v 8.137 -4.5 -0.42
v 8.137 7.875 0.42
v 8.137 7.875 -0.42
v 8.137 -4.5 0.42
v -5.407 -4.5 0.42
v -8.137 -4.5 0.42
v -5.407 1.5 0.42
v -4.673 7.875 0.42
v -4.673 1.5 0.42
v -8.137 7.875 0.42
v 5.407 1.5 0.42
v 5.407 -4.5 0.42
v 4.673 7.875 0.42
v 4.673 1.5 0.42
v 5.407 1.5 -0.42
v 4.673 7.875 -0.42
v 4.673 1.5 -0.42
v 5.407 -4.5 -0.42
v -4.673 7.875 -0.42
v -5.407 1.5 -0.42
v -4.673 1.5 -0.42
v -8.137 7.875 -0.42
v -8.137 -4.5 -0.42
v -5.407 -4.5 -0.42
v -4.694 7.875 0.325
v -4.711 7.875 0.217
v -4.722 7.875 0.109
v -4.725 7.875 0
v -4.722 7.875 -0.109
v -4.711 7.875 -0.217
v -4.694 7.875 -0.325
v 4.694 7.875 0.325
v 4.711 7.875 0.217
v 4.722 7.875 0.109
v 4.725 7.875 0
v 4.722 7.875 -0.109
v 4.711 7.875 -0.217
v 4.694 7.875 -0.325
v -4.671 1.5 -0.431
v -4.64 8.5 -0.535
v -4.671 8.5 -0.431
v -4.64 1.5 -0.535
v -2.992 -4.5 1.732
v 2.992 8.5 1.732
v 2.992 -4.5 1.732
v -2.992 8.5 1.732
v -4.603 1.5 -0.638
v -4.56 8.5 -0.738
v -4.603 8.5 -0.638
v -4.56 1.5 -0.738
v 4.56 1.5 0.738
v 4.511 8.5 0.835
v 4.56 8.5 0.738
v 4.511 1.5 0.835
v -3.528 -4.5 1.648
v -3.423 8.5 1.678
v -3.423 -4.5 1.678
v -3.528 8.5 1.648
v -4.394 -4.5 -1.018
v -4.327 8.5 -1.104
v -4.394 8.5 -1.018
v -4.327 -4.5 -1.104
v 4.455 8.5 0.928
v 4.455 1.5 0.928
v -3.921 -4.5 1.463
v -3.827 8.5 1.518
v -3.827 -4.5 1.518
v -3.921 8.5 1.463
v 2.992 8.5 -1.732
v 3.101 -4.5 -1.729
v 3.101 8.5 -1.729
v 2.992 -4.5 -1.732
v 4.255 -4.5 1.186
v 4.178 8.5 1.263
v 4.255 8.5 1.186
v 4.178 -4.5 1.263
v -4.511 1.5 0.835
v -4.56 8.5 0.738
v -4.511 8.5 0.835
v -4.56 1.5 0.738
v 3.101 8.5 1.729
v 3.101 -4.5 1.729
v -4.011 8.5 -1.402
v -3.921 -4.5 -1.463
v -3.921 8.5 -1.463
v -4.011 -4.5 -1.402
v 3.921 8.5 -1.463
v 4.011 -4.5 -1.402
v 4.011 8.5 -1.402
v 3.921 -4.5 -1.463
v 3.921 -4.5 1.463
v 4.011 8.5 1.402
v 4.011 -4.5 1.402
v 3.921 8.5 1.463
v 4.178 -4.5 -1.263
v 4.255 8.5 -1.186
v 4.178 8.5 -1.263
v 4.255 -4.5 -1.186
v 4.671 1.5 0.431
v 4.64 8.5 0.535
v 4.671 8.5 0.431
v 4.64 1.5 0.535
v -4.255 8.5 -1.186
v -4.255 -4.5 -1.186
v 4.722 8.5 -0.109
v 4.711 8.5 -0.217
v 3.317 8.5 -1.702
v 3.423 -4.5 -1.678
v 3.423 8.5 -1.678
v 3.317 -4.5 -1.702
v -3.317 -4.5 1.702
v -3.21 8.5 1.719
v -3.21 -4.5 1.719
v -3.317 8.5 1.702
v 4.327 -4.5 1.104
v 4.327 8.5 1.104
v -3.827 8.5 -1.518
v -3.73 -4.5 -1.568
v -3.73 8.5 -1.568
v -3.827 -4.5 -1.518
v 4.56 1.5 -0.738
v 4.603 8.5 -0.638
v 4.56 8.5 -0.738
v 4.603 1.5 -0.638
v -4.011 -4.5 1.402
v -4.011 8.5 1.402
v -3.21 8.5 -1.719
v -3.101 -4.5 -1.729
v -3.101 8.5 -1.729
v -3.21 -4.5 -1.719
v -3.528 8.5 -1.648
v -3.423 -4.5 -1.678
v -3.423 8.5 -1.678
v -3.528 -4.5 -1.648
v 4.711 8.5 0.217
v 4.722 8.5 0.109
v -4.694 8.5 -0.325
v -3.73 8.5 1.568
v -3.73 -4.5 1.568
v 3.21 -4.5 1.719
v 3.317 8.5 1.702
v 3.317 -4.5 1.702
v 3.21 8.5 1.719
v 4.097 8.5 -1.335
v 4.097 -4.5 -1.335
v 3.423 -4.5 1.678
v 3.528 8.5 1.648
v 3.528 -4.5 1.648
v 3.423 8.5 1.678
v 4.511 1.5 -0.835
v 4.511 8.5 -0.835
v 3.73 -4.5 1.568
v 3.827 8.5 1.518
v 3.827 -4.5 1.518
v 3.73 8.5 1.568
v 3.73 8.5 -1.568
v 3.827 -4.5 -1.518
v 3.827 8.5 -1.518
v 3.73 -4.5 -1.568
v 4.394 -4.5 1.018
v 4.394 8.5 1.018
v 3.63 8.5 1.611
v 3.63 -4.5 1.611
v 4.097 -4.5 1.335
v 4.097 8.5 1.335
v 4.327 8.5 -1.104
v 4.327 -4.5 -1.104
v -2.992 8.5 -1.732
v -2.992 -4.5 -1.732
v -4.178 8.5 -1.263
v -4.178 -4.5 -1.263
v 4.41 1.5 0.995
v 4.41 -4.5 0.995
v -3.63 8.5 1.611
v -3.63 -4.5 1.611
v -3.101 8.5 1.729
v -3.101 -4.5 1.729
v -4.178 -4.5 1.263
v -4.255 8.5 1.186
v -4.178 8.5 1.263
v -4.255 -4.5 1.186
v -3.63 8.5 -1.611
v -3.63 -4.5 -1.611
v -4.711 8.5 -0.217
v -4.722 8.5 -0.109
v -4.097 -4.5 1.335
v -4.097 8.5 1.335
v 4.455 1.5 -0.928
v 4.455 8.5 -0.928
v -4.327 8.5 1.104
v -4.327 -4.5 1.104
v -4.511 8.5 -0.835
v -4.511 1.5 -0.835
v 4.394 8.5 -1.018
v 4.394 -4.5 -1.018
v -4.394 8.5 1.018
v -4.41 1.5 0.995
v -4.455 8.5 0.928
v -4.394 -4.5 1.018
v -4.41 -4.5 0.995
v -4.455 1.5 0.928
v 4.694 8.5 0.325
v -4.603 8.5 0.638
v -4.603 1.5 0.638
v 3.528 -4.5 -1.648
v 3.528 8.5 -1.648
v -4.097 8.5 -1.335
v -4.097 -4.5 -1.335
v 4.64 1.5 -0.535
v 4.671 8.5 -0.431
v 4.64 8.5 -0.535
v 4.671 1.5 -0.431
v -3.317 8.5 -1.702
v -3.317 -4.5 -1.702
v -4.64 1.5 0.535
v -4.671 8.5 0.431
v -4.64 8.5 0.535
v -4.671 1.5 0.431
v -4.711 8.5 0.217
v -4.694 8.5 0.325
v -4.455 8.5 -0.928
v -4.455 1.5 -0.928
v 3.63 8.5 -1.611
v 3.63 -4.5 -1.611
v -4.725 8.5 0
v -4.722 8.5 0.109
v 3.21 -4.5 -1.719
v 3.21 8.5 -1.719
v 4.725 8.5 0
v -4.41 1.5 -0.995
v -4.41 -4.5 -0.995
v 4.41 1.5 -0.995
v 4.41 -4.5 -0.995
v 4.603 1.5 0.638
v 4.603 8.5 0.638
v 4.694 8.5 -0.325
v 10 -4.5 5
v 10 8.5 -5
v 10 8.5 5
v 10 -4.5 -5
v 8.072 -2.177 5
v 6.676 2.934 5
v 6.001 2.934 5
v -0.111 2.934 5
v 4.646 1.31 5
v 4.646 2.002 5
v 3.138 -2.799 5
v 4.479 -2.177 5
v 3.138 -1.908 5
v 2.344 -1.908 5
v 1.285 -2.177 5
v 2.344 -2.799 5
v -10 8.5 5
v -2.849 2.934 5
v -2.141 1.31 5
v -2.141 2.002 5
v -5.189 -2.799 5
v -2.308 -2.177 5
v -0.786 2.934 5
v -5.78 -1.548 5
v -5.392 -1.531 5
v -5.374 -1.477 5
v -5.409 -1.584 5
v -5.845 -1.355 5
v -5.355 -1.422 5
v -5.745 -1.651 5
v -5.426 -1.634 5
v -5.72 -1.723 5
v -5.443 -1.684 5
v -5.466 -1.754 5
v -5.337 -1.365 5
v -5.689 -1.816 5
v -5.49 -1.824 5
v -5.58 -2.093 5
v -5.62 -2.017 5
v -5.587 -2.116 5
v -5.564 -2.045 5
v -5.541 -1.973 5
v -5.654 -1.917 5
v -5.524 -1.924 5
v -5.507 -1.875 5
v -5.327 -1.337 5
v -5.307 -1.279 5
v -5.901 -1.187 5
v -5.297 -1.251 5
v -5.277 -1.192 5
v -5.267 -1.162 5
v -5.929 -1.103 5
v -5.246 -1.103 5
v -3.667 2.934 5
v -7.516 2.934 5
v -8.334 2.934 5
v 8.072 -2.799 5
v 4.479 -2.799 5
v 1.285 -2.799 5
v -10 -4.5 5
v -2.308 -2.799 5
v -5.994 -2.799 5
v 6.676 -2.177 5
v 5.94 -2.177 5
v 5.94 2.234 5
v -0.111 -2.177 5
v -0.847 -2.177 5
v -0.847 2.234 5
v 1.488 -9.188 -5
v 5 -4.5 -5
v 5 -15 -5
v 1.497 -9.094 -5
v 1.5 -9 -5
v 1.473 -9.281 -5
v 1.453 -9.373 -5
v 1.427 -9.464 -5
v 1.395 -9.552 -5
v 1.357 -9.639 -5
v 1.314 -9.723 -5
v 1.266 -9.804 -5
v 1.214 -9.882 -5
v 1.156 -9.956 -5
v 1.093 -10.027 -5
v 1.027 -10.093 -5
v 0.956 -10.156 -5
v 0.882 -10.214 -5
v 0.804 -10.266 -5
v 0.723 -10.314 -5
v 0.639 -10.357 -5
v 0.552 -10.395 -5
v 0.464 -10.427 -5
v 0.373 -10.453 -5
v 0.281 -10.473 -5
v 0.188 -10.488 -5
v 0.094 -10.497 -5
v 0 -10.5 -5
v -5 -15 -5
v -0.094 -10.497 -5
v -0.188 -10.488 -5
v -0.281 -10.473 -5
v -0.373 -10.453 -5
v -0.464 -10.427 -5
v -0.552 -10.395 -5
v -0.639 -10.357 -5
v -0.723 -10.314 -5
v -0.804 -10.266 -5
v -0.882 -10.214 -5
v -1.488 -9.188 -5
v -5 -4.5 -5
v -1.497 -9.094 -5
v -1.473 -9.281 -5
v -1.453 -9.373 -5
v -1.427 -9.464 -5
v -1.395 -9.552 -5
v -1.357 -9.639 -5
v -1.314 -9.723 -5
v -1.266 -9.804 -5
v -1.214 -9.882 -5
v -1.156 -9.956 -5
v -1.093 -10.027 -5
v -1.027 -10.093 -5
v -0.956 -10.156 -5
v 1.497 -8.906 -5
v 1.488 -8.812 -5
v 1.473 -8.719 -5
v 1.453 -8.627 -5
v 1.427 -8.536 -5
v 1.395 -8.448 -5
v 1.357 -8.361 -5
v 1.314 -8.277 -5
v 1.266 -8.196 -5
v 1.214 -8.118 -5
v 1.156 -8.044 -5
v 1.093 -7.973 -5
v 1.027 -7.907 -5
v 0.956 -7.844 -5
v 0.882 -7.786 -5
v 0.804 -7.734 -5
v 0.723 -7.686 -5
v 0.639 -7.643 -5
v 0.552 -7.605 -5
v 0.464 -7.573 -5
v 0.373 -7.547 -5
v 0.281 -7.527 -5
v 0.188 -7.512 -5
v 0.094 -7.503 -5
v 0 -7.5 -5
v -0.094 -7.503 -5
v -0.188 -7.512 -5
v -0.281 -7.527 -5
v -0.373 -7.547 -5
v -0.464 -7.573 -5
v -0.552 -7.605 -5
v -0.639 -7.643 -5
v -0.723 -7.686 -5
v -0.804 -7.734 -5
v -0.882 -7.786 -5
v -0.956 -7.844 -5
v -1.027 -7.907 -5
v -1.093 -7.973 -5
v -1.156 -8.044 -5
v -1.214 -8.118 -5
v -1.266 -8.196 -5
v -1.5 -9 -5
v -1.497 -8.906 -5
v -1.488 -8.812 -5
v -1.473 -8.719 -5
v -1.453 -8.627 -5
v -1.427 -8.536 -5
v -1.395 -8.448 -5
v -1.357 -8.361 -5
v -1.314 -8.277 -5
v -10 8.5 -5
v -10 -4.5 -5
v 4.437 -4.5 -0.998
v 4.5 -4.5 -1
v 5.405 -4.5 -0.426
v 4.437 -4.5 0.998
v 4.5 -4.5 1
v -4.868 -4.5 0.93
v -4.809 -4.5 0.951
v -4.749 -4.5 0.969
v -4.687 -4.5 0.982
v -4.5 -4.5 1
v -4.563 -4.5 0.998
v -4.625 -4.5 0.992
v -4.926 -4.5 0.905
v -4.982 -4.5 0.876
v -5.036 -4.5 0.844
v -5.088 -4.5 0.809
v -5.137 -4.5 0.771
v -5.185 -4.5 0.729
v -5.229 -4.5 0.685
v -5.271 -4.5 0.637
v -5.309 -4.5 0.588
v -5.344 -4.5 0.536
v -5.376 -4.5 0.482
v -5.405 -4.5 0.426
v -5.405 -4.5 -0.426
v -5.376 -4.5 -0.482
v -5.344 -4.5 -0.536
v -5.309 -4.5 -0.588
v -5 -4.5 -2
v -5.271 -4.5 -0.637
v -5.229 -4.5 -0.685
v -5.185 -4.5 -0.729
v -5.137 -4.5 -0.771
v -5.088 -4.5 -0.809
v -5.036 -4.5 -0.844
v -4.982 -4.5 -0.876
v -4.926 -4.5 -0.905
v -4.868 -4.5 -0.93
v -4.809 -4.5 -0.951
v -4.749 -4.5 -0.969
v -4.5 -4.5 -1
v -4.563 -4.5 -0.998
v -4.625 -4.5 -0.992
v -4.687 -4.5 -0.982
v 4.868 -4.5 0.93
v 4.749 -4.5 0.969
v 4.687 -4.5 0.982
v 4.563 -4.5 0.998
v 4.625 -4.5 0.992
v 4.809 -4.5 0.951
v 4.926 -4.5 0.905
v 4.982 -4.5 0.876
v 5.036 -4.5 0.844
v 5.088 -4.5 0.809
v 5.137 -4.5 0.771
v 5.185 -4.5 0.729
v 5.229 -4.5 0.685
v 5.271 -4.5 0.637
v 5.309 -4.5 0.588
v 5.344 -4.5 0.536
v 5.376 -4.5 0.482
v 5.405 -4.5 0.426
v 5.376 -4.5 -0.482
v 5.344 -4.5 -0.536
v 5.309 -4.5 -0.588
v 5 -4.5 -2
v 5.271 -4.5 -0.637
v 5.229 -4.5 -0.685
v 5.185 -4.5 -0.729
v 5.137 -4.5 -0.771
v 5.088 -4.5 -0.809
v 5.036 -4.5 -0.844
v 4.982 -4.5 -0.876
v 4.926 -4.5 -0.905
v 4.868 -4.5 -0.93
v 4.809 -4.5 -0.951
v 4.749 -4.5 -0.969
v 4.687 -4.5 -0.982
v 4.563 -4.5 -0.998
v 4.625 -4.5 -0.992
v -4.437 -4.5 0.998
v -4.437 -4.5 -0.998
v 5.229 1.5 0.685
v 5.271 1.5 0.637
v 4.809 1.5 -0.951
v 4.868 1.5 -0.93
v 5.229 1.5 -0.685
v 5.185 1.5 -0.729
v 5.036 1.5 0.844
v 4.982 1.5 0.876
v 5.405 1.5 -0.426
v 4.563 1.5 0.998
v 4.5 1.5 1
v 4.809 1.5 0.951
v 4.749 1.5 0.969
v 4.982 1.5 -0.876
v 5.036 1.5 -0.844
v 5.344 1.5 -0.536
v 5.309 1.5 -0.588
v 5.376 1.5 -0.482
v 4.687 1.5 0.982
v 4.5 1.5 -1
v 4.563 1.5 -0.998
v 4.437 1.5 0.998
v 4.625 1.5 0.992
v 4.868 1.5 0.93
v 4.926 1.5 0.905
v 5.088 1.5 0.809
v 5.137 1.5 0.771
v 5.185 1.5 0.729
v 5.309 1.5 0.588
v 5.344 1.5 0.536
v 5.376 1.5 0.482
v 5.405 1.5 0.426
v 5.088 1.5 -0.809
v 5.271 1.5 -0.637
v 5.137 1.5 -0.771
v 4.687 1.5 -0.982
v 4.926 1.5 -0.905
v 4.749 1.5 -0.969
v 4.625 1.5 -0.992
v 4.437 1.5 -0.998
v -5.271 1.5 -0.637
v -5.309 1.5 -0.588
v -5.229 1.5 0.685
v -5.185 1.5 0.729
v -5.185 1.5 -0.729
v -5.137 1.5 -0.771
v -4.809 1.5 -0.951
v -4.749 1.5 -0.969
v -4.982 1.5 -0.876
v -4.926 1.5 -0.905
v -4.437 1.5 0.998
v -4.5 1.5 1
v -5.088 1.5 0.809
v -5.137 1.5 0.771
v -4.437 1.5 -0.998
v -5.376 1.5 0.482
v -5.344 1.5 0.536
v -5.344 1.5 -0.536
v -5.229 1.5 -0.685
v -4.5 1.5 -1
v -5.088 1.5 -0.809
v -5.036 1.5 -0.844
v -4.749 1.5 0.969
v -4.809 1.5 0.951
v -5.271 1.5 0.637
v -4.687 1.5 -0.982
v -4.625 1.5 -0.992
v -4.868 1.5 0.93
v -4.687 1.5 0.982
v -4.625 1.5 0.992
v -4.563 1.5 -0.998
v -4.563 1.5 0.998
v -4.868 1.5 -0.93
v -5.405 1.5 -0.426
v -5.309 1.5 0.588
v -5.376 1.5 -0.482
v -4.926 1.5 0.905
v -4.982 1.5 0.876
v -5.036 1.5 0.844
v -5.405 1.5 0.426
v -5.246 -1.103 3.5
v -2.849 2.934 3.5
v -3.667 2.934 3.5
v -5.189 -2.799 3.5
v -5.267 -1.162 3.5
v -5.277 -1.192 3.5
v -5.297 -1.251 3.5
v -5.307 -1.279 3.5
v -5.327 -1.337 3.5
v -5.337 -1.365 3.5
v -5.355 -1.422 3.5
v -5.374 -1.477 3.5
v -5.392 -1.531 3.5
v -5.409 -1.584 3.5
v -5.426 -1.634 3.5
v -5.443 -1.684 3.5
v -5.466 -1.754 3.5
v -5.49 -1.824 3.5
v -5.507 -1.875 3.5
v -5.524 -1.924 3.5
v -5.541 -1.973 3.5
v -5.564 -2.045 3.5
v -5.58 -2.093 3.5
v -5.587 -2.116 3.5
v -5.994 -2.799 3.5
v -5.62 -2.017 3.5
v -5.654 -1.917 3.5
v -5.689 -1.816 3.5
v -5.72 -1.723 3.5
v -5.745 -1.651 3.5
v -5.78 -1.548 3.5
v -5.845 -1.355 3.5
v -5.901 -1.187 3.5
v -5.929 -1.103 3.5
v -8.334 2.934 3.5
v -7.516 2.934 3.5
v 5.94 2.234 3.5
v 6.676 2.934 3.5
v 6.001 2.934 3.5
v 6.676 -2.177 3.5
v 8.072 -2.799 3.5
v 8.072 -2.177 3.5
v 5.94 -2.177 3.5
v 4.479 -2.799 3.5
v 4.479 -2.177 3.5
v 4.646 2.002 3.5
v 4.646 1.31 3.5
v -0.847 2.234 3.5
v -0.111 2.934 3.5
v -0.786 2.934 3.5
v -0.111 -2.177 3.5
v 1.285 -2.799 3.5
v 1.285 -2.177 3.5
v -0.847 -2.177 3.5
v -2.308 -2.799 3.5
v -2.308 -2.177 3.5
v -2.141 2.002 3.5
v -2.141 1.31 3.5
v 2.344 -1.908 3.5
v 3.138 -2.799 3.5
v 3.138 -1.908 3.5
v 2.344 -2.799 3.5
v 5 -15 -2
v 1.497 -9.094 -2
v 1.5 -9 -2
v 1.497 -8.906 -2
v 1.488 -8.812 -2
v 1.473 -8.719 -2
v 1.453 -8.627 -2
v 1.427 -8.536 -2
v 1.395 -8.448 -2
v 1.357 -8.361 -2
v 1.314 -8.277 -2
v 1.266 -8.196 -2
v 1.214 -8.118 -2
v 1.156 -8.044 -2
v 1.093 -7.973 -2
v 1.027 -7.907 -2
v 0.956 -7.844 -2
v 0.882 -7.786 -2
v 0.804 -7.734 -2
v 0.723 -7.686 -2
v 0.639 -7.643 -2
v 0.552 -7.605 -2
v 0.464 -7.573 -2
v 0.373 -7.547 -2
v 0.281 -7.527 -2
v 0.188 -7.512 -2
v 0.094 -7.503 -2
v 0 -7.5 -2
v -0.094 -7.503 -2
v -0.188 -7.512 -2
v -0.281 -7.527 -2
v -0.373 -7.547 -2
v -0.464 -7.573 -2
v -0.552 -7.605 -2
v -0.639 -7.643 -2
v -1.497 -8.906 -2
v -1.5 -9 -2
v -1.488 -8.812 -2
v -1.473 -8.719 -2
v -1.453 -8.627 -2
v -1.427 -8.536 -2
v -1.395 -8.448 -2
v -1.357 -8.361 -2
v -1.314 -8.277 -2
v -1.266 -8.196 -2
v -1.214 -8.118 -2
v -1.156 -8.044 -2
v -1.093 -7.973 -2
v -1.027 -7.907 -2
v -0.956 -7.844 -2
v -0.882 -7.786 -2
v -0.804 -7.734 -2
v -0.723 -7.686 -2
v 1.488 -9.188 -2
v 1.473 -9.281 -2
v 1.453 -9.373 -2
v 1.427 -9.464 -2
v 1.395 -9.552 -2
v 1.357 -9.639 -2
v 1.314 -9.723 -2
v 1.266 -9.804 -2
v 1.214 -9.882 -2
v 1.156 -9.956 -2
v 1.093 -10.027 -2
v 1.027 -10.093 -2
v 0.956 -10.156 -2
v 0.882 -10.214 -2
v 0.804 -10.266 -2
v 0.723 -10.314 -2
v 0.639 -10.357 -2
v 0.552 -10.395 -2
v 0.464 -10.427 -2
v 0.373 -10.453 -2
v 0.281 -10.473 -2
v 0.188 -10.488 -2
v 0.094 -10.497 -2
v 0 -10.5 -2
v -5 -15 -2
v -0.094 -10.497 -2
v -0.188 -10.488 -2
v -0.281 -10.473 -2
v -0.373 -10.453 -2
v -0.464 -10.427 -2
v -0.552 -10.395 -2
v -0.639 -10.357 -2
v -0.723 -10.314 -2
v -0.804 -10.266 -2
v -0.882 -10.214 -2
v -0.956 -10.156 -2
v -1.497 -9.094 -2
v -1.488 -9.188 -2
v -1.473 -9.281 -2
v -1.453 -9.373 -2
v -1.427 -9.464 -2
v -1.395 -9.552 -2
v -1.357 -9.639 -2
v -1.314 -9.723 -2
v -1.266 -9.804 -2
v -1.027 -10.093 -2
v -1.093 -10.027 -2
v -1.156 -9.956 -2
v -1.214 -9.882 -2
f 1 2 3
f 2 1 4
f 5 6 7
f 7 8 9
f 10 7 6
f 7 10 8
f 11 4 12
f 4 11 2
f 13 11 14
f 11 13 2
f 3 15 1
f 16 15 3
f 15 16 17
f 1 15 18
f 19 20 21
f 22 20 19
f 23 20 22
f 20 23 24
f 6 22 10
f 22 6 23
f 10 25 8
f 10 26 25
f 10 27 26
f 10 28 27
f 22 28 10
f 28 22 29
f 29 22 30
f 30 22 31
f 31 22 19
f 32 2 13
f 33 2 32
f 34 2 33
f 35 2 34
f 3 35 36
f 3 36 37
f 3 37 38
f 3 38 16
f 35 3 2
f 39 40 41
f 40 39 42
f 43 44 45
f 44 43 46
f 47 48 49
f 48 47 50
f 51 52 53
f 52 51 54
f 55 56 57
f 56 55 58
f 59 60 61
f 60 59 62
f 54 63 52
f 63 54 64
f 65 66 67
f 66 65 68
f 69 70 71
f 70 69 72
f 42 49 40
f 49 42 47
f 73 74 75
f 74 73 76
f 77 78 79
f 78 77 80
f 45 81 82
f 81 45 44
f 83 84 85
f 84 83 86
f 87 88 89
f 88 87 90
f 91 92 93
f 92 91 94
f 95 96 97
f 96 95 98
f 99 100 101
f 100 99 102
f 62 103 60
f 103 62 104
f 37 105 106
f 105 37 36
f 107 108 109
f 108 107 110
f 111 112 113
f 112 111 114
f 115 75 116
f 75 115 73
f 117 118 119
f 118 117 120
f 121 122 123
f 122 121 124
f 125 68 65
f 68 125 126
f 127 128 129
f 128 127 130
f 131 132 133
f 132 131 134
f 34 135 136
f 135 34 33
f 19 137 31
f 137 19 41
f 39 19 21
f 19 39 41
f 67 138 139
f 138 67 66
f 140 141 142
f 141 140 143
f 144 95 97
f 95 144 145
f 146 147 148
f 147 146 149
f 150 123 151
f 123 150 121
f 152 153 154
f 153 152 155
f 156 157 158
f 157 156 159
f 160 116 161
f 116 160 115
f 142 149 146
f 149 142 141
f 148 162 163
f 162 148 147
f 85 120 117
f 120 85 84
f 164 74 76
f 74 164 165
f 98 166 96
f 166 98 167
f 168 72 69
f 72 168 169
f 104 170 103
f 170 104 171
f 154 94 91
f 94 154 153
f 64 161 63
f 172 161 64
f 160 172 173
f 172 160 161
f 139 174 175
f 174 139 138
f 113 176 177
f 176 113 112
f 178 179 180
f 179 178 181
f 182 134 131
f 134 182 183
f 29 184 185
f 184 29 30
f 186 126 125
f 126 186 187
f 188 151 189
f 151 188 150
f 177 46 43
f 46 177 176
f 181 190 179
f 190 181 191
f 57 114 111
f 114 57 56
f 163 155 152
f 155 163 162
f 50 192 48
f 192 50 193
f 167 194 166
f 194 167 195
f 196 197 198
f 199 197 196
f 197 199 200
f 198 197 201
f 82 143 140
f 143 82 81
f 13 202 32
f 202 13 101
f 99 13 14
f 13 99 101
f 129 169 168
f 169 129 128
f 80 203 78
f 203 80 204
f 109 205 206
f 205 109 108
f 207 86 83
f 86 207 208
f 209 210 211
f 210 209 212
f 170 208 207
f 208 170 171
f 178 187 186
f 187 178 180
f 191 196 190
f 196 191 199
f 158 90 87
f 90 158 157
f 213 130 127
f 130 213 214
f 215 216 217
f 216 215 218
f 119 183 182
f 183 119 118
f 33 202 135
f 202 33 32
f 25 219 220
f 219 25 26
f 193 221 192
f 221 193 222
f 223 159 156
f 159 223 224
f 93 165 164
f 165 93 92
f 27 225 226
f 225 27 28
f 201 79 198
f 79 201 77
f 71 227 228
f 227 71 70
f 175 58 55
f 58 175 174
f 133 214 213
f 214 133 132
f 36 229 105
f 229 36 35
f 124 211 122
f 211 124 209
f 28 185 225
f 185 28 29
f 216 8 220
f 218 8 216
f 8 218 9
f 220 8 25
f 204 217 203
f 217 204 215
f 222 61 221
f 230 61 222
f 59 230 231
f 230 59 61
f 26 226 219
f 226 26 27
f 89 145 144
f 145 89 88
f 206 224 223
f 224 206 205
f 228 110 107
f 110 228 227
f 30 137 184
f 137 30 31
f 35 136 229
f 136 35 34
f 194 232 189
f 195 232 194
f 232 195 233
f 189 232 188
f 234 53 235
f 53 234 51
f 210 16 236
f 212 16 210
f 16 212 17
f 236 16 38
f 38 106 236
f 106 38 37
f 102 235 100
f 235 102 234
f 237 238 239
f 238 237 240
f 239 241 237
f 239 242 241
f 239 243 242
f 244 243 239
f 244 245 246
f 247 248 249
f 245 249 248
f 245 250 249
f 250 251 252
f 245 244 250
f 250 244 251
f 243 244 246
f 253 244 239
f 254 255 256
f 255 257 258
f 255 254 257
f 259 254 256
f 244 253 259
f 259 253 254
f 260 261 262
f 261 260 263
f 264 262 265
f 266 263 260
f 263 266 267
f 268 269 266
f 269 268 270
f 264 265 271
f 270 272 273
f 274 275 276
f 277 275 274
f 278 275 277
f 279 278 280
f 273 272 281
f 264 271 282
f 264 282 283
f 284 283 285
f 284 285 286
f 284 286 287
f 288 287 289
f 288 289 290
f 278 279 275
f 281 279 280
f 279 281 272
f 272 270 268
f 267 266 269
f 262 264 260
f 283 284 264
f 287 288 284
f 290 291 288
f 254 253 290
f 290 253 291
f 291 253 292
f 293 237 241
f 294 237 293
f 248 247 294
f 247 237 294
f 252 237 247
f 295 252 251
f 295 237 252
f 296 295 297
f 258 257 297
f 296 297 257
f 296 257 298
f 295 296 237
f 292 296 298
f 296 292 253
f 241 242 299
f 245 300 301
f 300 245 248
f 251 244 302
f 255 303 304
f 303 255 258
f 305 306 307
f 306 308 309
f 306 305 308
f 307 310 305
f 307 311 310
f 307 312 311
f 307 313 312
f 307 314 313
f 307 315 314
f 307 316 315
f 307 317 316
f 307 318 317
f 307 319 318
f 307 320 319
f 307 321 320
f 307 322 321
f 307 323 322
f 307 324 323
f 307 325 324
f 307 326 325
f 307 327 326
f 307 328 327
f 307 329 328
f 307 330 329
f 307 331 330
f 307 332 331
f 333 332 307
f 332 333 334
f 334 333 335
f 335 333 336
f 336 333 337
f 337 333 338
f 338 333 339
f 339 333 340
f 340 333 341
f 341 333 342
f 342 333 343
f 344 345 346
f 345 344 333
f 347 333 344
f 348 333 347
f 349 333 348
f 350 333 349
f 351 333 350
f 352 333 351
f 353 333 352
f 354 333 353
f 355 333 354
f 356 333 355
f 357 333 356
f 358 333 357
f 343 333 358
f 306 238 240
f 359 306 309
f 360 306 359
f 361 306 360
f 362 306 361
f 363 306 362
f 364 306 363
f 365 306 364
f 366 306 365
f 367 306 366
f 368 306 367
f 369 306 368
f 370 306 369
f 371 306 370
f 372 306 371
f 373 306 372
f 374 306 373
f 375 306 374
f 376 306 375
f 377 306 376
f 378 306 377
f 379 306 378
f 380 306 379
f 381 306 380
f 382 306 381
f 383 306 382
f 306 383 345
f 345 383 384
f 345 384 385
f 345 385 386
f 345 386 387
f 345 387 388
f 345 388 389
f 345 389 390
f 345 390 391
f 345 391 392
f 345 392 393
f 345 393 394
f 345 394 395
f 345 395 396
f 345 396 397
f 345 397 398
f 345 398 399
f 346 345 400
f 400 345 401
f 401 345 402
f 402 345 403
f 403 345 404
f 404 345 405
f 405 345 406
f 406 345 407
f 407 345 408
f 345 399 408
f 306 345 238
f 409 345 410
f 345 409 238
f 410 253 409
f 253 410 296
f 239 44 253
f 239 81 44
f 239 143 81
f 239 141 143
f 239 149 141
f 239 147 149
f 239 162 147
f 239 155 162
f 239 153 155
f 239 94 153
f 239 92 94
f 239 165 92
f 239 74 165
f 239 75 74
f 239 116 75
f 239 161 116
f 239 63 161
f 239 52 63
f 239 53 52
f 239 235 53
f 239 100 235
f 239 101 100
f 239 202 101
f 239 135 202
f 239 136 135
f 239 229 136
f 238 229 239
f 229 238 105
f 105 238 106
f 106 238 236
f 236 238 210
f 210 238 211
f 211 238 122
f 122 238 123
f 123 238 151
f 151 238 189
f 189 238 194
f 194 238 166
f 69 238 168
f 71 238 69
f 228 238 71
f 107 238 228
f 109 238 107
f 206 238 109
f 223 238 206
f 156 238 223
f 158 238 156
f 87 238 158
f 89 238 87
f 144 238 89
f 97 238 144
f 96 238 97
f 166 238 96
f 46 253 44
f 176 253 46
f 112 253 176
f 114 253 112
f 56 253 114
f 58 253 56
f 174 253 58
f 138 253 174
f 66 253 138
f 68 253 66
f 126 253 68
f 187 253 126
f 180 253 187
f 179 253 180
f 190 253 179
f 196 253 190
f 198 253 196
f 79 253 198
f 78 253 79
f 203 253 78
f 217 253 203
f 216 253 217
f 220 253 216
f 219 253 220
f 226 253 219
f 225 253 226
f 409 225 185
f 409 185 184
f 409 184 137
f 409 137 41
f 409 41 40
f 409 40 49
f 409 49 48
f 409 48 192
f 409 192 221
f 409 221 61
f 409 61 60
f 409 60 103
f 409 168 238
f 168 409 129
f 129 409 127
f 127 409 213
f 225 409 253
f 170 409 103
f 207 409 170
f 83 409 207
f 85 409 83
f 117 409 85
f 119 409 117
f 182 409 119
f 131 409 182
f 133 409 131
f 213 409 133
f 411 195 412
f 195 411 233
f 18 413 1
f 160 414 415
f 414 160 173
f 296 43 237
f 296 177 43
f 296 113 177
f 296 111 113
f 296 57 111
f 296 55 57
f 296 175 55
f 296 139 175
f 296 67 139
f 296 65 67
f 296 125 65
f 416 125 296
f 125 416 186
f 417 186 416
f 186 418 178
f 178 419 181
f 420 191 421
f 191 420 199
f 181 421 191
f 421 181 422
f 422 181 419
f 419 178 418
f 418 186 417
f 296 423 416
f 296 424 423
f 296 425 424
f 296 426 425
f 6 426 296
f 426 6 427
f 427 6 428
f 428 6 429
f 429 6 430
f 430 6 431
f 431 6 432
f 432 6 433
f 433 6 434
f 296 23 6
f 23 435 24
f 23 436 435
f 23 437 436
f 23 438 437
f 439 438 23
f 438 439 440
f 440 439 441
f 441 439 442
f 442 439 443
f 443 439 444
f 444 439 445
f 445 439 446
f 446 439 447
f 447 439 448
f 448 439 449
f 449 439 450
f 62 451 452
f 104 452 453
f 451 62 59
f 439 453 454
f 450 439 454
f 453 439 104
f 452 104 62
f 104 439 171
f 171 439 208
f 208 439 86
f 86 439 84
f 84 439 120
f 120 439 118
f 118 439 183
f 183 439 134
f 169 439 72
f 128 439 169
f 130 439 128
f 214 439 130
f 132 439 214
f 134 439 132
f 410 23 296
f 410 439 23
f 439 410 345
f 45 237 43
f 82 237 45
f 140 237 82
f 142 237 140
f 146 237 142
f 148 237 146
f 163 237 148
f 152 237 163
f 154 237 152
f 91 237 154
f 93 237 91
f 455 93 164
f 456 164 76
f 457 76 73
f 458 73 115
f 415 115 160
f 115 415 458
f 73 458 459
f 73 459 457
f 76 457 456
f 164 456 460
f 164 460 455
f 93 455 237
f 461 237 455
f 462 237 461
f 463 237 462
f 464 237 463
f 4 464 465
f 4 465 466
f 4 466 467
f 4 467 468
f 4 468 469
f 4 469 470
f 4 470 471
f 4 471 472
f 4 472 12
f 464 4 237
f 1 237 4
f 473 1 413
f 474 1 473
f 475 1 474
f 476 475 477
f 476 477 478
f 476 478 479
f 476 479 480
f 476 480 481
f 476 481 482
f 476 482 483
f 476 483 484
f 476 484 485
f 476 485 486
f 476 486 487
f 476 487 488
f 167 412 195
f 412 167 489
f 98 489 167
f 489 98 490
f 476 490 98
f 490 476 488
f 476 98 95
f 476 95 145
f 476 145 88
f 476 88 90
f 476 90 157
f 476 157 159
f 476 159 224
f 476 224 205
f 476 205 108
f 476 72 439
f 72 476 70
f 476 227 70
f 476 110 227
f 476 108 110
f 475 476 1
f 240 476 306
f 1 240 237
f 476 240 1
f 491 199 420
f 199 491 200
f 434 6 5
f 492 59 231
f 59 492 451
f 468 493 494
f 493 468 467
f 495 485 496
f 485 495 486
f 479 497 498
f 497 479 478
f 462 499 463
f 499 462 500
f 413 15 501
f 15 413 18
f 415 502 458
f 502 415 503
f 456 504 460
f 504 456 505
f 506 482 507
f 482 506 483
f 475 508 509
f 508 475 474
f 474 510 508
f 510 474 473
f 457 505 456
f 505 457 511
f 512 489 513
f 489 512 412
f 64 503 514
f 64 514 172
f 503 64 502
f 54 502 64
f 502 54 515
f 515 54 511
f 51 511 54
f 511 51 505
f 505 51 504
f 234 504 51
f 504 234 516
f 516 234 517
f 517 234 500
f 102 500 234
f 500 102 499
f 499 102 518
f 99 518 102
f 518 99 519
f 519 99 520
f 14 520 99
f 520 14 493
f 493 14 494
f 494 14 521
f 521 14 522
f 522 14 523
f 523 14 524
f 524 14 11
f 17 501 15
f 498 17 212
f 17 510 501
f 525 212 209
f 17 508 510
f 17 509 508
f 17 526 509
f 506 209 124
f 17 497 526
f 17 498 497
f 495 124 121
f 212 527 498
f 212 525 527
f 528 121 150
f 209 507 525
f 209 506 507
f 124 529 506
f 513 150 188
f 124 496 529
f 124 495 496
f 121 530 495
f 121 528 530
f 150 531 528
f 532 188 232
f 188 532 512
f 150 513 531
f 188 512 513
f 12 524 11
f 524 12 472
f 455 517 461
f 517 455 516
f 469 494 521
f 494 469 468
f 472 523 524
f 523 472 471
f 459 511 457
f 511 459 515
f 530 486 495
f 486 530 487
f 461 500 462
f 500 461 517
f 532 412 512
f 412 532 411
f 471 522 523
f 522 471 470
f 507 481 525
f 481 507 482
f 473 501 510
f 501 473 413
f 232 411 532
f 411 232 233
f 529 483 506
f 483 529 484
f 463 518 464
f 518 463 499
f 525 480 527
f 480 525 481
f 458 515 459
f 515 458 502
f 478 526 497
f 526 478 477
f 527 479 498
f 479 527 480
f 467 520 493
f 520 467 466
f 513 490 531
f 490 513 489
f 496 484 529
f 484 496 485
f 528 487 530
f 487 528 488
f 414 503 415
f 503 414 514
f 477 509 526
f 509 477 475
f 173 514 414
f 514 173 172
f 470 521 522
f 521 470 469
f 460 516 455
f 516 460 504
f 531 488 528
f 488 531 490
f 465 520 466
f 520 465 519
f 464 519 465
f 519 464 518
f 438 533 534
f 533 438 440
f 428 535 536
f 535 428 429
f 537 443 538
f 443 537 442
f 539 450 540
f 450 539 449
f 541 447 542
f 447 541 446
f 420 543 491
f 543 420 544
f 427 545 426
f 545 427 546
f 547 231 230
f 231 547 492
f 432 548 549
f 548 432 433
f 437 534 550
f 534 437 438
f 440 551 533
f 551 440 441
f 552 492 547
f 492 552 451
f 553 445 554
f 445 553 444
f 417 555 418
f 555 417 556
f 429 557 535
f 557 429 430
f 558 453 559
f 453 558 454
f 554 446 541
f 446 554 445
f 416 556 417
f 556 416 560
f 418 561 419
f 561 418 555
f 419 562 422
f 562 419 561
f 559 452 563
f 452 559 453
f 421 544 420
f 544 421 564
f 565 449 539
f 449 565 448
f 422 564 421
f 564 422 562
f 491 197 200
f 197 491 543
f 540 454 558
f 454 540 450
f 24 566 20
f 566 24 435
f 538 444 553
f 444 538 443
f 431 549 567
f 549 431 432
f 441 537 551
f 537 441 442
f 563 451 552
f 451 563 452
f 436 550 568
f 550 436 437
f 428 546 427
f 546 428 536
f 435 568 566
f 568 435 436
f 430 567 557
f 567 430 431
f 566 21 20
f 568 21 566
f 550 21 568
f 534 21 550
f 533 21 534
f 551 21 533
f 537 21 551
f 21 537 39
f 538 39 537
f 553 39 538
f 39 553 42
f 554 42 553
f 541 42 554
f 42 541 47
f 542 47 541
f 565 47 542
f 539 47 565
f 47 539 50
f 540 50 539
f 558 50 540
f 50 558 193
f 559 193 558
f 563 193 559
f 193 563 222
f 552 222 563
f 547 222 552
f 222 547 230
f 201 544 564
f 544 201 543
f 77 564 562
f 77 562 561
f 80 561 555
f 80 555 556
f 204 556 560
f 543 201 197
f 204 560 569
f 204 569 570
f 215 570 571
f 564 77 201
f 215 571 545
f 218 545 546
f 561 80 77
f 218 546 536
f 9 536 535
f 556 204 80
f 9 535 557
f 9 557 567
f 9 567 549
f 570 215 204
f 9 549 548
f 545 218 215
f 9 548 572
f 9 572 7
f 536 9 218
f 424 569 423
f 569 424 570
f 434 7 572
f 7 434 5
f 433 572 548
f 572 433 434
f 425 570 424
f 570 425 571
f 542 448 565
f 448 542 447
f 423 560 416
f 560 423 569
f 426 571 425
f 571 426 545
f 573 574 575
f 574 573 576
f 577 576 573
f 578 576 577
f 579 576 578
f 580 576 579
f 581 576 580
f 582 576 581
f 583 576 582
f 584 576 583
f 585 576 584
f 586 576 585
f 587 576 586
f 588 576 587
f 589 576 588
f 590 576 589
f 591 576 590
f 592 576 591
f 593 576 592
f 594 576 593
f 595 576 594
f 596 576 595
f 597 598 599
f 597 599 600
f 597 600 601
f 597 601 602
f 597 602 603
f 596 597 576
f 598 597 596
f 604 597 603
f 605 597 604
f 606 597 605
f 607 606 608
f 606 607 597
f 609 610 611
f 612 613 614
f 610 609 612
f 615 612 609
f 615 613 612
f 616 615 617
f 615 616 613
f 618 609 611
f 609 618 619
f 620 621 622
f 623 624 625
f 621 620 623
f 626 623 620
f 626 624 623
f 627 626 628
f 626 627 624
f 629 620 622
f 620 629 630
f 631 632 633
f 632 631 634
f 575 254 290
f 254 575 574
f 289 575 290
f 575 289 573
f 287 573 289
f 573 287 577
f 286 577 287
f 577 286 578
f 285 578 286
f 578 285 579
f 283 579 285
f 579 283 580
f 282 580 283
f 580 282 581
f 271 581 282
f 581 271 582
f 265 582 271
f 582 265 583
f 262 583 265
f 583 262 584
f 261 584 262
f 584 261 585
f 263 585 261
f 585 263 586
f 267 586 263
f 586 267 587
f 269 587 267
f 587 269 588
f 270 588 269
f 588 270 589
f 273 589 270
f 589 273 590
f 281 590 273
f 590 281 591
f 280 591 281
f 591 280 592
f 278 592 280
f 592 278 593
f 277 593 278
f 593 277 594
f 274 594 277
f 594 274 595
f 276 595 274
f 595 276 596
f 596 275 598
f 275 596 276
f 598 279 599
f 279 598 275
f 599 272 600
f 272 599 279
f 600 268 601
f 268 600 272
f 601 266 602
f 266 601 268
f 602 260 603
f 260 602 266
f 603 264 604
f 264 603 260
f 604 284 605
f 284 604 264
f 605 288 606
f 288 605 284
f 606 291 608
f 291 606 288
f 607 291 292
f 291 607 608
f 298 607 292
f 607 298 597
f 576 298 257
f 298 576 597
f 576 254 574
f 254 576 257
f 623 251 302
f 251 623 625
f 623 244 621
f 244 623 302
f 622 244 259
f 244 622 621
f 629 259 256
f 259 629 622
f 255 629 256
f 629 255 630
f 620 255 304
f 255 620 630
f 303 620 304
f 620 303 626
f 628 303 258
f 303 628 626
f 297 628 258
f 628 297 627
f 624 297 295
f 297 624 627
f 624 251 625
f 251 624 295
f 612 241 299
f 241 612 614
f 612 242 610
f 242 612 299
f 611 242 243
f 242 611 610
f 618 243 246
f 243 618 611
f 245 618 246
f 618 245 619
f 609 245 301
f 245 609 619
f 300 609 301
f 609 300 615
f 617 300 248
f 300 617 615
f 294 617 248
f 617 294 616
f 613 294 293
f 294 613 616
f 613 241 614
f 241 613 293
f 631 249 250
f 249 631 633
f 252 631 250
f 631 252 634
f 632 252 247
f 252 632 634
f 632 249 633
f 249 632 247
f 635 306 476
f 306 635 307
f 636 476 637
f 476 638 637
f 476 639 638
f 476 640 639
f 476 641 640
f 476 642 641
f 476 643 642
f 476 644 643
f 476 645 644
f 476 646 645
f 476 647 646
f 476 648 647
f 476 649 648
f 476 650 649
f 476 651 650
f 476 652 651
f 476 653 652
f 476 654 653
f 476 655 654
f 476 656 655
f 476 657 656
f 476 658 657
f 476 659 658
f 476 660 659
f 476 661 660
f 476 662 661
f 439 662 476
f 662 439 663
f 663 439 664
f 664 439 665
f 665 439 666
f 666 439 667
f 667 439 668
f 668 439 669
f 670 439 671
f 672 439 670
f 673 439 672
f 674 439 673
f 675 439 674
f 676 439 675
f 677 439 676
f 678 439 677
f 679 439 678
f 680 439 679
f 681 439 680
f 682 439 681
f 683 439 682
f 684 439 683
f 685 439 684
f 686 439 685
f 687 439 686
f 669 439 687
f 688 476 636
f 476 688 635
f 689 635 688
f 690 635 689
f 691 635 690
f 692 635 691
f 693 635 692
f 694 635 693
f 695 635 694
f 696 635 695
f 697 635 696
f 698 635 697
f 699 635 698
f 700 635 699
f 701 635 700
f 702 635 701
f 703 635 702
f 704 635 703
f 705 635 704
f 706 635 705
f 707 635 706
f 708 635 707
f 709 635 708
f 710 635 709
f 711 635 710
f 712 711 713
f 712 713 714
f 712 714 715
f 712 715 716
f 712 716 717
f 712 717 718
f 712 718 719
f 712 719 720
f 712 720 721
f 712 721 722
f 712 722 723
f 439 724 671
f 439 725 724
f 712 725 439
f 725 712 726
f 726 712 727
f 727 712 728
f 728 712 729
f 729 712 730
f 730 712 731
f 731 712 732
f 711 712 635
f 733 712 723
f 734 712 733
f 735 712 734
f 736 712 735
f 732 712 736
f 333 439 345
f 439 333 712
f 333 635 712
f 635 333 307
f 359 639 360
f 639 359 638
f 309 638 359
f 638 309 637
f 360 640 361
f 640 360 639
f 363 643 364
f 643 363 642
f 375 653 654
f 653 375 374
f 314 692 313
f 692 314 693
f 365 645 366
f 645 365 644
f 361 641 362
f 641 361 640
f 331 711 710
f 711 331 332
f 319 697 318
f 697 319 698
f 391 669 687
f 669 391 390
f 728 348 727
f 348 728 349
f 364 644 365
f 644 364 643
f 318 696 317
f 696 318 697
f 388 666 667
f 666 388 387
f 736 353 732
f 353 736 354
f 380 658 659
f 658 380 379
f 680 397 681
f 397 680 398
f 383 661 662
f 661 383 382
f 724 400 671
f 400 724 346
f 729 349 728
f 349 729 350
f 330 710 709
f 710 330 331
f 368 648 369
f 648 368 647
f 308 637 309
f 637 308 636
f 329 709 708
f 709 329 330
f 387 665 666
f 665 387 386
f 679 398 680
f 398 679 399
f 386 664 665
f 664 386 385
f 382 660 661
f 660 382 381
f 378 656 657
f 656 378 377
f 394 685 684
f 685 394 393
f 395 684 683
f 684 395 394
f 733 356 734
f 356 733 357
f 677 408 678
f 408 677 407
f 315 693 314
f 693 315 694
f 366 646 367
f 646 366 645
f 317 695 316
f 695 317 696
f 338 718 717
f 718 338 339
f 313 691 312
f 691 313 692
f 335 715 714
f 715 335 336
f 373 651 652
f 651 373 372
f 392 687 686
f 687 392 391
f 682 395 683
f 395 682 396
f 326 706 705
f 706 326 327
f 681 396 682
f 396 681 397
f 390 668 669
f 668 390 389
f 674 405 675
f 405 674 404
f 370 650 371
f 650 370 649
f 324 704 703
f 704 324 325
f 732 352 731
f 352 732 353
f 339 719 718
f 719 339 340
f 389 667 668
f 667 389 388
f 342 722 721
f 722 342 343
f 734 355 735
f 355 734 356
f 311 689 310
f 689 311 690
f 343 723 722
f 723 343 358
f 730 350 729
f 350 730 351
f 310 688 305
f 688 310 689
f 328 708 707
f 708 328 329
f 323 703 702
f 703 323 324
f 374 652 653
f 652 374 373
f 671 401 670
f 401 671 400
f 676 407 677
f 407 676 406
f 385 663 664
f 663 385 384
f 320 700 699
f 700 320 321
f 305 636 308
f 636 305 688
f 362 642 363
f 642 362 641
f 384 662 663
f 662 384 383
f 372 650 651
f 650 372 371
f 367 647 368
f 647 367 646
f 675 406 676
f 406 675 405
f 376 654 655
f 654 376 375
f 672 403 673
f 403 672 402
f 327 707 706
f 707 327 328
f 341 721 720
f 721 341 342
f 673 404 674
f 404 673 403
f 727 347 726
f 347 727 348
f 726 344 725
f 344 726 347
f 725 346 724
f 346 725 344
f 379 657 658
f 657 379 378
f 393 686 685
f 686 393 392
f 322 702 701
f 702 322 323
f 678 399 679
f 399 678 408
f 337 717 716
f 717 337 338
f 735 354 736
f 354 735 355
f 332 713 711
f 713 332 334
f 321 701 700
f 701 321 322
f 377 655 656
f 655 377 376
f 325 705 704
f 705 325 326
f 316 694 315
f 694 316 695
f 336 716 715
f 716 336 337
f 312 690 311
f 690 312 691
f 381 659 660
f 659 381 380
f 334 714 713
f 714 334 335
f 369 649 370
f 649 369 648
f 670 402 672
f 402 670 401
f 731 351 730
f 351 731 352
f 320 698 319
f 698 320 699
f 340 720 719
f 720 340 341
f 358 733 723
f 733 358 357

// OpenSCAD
// this is for a small esp8266-01 module adapter
$fn=100;

module usbcConnectorPCB(extrude) {
    //PCB
    board = [ 15.5, 15, .8] ;
    color("green") cube(board,center=true);
    //connector
    usbcD=3.3; usbcL=12 + extrude; usbcW=9; usbcEgress=2;
    color("silver")
        translate([-usbcW/2 + usbcD/2, (board.y - usbcL)/2 + usbcEgress, 0]) 
            rotate([-90, 0, 0]) 
                hull(){
                    translate([0, 0, 0]) cylinder(h=usbcL, d=usbcD, center=true);
                    translate([usbcW - usbcD, 0, 0]) cylinder(h=usbcL, d=usbcD, center=true);
                }
}

module usbcConnectorMount(){
    version="V1.1";
    difference() {
        translate([0, 2, 0]) cube([20, 13, 10],center=true);
        scale([1.05, 1.05, 1.05]) usbcConnectorPCB(7);
        translate([4.5,-3,0]) rotate([-90, 0, 0]) cylinder(h=9,d=2,center=true);
        translate([-4.5,-3,0]) rotate([-90, 0, 0]) cylinder(h=9,d=2,center=true);
        translate([0,0,3.5]) linear_extrude(2) text(version,size=6,halign="center",valign="center");
    }
    //add a tab with hole to fix the connector
    difference(){
        translate([0, -5, -3.5])  cube([10, 20, 3],center=true);
        translate([0, -9, -6])  cylinder(h=10,d=3);
    }
}
color("lightblue") usbcConnectorMount();
*usbcConnectorPCB(0);
